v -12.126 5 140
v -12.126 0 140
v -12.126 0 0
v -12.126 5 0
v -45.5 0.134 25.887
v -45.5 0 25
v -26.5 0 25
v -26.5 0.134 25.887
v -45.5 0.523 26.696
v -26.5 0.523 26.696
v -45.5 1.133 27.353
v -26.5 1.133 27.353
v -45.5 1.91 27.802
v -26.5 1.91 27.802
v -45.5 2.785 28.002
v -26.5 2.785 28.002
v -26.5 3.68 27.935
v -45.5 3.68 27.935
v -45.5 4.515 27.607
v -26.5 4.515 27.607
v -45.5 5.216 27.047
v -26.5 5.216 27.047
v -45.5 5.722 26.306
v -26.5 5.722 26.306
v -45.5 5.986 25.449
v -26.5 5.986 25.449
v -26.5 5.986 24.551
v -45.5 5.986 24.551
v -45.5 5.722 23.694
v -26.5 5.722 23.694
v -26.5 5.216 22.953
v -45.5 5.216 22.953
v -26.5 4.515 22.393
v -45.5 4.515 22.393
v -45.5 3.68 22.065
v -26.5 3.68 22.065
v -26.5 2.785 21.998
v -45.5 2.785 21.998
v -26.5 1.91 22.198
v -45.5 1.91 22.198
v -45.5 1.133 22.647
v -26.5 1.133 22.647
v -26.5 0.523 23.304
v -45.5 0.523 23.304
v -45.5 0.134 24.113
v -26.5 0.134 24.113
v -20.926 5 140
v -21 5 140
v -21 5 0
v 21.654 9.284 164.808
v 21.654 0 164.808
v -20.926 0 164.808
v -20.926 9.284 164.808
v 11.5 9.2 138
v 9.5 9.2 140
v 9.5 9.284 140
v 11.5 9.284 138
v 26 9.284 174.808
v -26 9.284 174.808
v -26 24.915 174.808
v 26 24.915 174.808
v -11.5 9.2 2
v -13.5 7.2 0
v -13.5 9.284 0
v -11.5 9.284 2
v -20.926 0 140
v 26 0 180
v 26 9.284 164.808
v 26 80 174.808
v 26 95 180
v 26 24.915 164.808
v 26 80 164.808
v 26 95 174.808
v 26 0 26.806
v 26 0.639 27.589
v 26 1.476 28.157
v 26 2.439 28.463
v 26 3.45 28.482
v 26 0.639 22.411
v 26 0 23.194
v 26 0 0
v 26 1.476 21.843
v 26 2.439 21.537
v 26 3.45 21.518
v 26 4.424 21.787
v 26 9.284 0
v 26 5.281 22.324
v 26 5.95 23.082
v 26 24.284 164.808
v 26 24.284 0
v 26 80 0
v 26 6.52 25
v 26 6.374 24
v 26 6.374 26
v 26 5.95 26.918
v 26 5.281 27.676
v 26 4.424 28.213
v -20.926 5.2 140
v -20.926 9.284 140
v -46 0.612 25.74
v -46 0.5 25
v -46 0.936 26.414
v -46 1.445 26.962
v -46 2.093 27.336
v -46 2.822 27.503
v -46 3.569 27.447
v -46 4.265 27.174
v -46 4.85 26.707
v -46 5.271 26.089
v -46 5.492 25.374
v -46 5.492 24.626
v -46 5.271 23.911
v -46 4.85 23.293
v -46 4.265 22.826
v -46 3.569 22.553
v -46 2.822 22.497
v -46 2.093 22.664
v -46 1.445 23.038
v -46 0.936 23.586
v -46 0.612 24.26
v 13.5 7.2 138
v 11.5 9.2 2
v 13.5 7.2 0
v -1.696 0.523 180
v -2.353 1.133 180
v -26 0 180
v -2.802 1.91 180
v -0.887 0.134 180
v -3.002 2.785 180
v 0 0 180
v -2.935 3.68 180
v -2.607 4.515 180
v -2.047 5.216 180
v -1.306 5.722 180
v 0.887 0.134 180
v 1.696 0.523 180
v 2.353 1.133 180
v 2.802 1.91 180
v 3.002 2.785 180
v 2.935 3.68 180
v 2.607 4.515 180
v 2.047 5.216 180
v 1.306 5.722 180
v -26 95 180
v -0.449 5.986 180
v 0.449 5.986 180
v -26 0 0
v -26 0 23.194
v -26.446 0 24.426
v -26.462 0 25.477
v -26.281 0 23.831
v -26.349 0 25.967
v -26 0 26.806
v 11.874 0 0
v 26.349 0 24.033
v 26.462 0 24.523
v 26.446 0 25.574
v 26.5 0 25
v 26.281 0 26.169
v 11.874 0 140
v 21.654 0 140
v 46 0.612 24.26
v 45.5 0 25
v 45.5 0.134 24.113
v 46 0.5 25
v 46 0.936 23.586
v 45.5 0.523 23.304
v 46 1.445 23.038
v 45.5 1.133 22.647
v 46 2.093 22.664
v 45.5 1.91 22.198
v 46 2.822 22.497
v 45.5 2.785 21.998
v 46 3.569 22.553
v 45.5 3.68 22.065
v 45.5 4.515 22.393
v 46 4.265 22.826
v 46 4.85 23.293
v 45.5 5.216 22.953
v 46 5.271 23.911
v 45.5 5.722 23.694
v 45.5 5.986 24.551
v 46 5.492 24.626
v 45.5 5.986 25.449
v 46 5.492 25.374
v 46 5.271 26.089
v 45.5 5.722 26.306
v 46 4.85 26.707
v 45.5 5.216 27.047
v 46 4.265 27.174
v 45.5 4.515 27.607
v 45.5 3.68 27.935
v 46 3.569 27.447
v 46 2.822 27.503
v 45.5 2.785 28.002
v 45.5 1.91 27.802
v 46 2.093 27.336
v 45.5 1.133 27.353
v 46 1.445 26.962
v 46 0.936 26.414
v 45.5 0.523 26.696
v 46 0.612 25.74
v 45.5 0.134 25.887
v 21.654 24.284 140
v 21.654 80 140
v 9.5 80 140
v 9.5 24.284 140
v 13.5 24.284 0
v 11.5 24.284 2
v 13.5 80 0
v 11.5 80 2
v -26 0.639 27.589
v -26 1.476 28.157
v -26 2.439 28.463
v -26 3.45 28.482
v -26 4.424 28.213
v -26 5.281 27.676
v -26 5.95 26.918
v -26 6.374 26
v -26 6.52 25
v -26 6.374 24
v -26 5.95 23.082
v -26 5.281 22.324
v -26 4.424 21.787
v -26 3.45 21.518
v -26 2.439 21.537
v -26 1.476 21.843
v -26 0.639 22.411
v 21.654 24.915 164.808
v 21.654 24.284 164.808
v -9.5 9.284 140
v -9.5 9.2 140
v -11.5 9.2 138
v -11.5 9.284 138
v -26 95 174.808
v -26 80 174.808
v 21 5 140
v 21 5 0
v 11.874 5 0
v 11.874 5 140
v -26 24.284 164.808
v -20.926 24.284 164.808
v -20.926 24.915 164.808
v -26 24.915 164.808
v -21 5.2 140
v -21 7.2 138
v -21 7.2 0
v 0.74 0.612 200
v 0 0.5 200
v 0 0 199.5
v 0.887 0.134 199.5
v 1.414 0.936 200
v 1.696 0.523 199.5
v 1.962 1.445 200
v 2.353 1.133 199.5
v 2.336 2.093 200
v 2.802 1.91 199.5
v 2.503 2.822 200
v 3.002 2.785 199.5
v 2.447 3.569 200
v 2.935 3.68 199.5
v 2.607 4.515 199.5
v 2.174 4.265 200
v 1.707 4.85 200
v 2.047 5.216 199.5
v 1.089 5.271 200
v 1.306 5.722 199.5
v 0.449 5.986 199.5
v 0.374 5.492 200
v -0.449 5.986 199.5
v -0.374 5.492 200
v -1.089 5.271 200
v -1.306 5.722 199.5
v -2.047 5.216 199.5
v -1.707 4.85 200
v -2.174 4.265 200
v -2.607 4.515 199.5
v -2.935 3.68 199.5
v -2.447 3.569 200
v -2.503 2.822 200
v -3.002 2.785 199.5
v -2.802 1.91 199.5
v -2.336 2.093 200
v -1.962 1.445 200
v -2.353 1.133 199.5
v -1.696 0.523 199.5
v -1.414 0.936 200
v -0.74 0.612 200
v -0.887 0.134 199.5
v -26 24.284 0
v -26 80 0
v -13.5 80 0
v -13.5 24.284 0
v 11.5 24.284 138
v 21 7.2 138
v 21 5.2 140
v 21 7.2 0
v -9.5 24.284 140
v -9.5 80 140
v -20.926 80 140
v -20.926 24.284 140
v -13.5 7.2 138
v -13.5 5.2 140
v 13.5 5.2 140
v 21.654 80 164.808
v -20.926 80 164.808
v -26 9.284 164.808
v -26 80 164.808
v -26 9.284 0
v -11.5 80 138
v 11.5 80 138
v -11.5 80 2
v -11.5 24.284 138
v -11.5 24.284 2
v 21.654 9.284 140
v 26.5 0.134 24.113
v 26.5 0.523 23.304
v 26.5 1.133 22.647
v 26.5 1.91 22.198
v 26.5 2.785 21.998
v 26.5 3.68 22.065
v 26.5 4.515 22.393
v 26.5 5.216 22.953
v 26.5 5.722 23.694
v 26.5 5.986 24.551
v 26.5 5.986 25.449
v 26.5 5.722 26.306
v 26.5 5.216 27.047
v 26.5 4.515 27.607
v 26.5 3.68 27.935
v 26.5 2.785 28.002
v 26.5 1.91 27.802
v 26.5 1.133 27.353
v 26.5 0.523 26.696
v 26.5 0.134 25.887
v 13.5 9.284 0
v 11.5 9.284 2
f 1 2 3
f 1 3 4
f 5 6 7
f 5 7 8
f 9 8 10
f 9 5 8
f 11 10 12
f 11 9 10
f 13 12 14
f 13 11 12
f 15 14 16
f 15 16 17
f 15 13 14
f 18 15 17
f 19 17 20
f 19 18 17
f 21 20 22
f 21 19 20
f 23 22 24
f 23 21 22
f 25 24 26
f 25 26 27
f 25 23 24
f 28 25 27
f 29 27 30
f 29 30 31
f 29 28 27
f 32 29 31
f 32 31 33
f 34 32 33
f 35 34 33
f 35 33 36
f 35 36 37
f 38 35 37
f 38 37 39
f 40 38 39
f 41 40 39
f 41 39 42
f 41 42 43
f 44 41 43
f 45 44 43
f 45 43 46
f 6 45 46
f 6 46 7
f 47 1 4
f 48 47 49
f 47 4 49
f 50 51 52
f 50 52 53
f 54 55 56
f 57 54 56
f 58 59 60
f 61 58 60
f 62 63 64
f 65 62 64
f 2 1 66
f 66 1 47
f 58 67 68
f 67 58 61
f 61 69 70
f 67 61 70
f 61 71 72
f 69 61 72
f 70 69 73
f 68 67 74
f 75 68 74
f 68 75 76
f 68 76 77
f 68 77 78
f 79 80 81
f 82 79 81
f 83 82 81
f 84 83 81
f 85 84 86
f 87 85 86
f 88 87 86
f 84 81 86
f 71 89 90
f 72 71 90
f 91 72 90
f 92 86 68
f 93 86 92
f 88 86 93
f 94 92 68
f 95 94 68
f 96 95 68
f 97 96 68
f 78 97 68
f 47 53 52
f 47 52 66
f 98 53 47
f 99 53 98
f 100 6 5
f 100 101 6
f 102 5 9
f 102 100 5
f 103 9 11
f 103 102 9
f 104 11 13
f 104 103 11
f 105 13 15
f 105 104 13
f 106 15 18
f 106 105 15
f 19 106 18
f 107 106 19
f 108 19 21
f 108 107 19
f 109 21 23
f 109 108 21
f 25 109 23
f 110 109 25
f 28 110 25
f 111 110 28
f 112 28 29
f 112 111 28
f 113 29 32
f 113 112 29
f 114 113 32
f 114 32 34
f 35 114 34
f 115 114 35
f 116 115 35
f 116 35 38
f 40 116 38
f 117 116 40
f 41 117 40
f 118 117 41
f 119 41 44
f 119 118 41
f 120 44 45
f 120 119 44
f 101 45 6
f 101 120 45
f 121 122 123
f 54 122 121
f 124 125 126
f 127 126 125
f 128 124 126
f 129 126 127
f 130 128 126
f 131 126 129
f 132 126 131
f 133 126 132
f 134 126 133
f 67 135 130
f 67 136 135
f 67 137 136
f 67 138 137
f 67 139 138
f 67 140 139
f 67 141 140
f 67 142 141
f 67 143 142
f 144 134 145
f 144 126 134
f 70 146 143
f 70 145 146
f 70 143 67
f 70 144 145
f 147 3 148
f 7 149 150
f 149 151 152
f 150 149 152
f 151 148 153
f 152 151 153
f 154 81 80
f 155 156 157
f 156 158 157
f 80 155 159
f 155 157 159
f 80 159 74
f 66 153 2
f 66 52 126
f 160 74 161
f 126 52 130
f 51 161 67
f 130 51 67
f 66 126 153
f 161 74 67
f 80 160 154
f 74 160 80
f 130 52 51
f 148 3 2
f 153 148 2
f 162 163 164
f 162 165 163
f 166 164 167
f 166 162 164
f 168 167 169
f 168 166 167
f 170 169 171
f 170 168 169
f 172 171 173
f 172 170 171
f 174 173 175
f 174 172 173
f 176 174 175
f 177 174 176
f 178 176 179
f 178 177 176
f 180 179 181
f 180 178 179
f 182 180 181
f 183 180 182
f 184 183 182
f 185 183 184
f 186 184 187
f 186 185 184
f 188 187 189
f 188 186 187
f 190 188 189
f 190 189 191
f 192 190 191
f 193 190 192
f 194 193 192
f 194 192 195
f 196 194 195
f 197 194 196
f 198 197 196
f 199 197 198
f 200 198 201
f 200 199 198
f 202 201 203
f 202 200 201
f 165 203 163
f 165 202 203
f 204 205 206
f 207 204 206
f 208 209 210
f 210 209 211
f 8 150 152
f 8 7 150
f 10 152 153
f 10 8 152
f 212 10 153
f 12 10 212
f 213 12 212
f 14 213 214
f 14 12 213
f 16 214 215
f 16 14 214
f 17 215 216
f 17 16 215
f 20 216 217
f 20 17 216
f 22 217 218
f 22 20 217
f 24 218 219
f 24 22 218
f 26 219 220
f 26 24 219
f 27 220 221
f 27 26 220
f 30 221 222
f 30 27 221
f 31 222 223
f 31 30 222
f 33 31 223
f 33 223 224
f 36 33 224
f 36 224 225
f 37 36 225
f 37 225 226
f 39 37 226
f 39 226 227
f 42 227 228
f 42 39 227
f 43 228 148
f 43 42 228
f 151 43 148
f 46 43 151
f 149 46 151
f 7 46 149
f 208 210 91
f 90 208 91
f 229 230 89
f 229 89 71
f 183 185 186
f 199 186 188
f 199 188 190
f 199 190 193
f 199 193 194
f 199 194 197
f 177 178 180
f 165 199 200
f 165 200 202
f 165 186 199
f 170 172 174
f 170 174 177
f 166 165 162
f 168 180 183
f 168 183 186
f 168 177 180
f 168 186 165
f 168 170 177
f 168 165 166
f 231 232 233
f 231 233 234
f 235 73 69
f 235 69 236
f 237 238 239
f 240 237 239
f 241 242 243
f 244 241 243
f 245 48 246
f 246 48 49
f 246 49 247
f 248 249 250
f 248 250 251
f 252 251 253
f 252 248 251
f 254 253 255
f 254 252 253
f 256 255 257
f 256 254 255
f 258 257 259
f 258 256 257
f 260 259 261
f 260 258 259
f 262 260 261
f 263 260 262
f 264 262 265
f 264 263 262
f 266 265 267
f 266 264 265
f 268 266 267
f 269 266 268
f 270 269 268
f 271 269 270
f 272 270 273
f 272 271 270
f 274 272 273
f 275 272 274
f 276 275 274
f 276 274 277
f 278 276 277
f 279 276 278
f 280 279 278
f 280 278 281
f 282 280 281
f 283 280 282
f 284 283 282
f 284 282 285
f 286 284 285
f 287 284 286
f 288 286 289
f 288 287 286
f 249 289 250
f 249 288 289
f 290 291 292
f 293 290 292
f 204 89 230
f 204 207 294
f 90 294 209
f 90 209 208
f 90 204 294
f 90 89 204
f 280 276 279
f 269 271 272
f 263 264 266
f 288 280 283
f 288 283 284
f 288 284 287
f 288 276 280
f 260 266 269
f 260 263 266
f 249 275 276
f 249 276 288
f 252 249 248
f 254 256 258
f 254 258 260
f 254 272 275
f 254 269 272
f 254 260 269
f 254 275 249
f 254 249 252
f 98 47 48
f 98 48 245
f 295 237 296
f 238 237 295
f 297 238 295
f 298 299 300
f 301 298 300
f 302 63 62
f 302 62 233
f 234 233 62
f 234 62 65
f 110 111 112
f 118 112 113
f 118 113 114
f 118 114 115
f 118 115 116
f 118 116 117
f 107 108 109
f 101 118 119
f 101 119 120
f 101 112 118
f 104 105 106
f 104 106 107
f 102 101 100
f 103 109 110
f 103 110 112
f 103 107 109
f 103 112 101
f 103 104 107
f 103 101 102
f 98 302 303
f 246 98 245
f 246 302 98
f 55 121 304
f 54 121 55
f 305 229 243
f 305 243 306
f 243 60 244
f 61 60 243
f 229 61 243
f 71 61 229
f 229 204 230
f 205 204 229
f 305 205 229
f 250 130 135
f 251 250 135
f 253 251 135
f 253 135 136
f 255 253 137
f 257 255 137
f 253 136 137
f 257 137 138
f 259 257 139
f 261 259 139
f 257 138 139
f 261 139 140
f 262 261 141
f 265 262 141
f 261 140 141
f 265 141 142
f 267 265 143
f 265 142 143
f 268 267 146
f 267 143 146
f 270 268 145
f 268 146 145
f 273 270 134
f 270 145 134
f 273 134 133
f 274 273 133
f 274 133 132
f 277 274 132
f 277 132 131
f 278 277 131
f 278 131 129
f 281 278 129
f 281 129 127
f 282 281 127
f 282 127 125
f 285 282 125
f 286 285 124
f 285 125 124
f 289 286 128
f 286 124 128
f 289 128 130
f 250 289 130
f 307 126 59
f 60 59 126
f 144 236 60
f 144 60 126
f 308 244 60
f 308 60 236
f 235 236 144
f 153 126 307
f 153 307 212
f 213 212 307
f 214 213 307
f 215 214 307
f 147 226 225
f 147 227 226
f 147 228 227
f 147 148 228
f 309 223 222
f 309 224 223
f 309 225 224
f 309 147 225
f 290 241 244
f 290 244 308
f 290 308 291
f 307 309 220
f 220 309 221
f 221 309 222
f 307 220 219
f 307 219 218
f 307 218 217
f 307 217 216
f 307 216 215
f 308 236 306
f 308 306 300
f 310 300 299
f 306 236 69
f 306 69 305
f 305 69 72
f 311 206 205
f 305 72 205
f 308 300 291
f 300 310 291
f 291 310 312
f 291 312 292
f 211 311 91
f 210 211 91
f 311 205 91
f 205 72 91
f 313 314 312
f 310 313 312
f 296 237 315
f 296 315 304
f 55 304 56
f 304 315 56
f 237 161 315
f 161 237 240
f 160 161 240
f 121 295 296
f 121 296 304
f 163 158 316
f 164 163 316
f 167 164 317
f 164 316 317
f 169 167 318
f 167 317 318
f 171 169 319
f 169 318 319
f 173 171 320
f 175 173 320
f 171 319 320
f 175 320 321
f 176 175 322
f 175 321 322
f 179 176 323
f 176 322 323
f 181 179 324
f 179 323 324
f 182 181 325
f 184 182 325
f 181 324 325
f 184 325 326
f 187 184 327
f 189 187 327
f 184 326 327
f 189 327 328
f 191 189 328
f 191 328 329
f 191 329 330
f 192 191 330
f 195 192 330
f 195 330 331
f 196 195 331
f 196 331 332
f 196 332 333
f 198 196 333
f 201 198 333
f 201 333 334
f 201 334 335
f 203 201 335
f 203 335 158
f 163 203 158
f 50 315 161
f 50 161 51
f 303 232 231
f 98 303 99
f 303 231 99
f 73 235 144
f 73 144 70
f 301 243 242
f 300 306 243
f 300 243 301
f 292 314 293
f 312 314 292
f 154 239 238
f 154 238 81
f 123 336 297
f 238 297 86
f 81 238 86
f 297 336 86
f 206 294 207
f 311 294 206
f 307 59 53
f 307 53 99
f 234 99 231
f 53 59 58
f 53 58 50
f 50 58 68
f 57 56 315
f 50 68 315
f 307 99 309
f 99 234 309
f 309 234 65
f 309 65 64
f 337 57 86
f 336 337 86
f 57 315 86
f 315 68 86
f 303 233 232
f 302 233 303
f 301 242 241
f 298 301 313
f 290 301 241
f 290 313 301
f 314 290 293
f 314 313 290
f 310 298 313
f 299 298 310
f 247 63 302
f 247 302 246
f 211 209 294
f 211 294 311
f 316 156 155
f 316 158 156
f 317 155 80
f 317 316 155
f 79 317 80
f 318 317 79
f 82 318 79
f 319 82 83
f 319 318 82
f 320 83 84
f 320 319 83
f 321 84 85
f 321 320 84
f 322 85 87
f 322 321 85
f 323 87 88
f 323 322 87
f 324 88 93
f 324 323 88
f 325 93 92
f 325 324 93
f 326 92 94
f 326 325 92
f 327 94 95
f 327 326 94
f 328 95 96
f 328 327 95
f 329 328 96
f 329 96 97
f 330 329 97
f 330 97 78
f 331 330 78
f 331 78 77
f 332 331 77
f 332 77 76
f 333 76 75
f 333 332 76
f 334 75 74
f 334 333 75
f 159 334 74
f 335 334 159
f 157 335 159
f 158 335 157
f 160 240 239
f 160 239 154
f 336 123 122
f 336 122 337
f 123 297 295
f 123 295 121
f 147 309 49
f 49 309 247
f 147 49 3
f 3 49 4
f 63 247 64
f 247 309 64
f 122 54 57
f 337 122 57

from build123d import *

# Parameters (mm, degrees)
SKETCH_1_W           = 52
SKETCH_1_H           = 95
EXTRUDE_1_DEPTH      = 180
SKETCH_2_W           = 23
SKETCH_2_H           = 90
CUT_EXTRUDE_1_DEPTH  = 140
SKETCH_3_W           = 9.5
SKETCH_3_H           = 2.2
CUT_EXTRUDE_2_DEPTH  = 140
CHAMFER_1_SIZE       = 2
CUT_EXTRUDE_3_DEPTH  = 140
SKETCH_5_W           = 140
SKETCH_5_H           = 15
CUT_EXTRUDE_4_DEPTH  = 140
SKETCH_6_W           = 140
SKETCH_6_H           = 15
CUT_EXTRUDE_7_DEPTH  = 140
CUT_EXTRUDE_8_DEPTH  = 140
SKETCH_8_W           = 24.808453611
SKETCH_8_H           = 15
CUT_EXTRUDE_9_DEPTH  = 140
SKETCH_9_W           = 10
SKETCH_9_H           = 14.176065277
SKETCH_9_H_2         = 15.630765607
CUT_EXTRUDE_10_DEPTH = 140
SKETCH_10_W          = 52
SKETCH_10_H          = 0.823934723
CUT_EXTRUDE_11_DEPTH = 10
SKETCH_12_R          = 3.01
EXTRUDE_2_DEPTH      = 20
CHAMFER_3_SIZE       = 0.5
SKETCH_13_R          = 3.01
EXTRUDE_4_DEPTH      = 20
CHAMFER_4_SIZE       = 0.5
EXTRUDE_START        = 20
SKETCH_15_R          = 3.01
EXTRUDE_5_DEPTH      = 20
CHAMFER_5_SIZE       = 0.5


with BuildPart() as part:
    # 草图1 → 凸台-拉伸1 (new body)
    with BuildSketch(Plane.XY):
        with Locations((0, 47.5)):
            Rectangle(SKETCH_1_W, SKETCH_1_H)
    extrude(amount=EXTRUDE_1_DEPTH)

    # 草图2 → 切除-拉伸1 (cut)
    with BuildSketch(Plane(origin=(0, 0, 0), x_dir=(-1, 0, 0), z_dir=(0, 0, -1))):
        with Locations((0, 50)):
            Rectangle(SKETCH_2_W, SKETCH_2_H)
    extrude(amount=-CUT_EXTRUDE_1_DEPTH, mode=Mode.SUBTRACT)

    # 草图3 → 切除-拉伸2 (cut)
    with BuildSketch(Plane(origin=(0, 0, 0), x_dir=(-1, 0, 0), z_dir=(0, 0, -1))):
        with Locations((-16.25, 6.1)):
            Rectangle(SKETCH_3_W, SKETCH_3_H)
        with Locations((16.25, 6.1)):
            Rectangle(SKETCH_3_W, SKETCH_3_H)
    extrude(amount=-CUT_EXTRUDE_2_DEPTH, mode=Mode.SUBTRACT)

    # 倒角1
    chamfer_1_edges = [part.edges().sort_by_distance(p)[0] for p in [
        (11.5, 51.1, 140),
        (0, 95, 140),
        (11.5, 95, 70),
        (-11.5, 95, 70),
        (11.5, 51.1, 0),
        (-11.5, 51.1, 140),
        (-11.5, 51.1, 0),
        (11.5, 7.2, 70),
        (16.25, 7.2, 140),
        (-16.25, 7.2, 140),
        (-11.5, 7.2, 70),
    ]]
    chamfer(chamfer_1_edges, length=CHAMFER_1_SIZE)

    # 草图4 → 切除-拉伸3 (cut)
    with BuildSketch(Plane(origin=(0, 0, 0), x_dir=(-1, 0, 0), z_dir=(0, 0, -1))):
        Polygon((-0.565514489, 0), (0, 0), (12.126296858, 0), (12.126296858, 5), (-11.873703142, 5), (-11.873703142, 0), align=None)
    extrude(amount=-CUT_EXTRUDE_3_DEPTH, mode=Mode.SUBTRACT)

    # 草图5 → 切除-拉伸4 (cut)
    with BuildSketch(Plane(origin=(26, 0, 0), x_dir=(0, 0, -1), z_dir=(1, 0, 0))):
        with Locations((-70, 87.5)):
            Rectangle(SKETCH_5_W, SKETCH_5_H)
    extrude(amount=-CUT_EXTRUDE_4_DEPTH, mode=Mode.SUBTRACT)

    # 草图6 → 切除-拉伸7 (cut)
    with BuildSketch(Plane(origin=(26, 0, 0), x_dir=(0, 0, -1), z_dir=(1, 0, 0))):
        with Locations((-70, 16.784197303)):
            Rectangle(SKETCH_6_W, SKETCH_6_H)
    extrude(amount=-CUT_EXTRUDE_7_DEPTH, mode=Mode.SUBTRACT)

    # 草图7 → 切除-拉伸8 (cut)
    with BuildSketch(Plane(origin=(0, 95, 0), x_dir=(1, 0, 0), z_dir=(0, 1, 0))):
        Polygon((0, -140), (21.6540992, -140), (21.6540992, -164.808453611), (-20.3459008, -164.808453611), (-20.926391083, -164.808453611), (-20.926391083, -140), align=None)
    extrude(amount=-CUT_EXTRUDE_8_DEPTH, mode=Mode.SUBTRACT)

    # 草图8 → 切除-拉伸9 (cut)
    with BuildSketch(Plane(origin=(26, 0, 0), x_dir=(0, 0, -1), z_dir=(1, 0, 0))):
        with Locations((-152.404226806, 87.5)):
            Rectangle(SKETCH_8_W, SKETCH_8_H)
        with Locations((-152.404226806, 16.784197303)):
            Rectangle(SKETCH_8_W, SKETCH_8_H)
    extrude(amount=-CUT_EXTRUDE_9_DEPTH, mode=Mode.SUBTRACT)

    # 草图9 → 切除-拉伸10 (cut)
    with BuildSketch(Plane(origin=(26, 0, 0), x_dir=(0, 0, -1), z_dir=(1, 0, 0))):
        with Locations((-169.808453611, 87.911967362)):
            Rectangle(SKETCH_9_W, SKETCH_9_H)
        with Locations((-169.808453611, 17.099580106)):
            Rectangle(SKETCH_9_W, SKETCH_9_H_2)
    extrude(amount=-CUT_EXTRUDE_10_DEPTH, mode=Mode.SUBTRACT)

    # 草图10 → 切除-拉伸11 (cut)
    with BuildSketch(Plane(origin=(0, 0, 164.808453611), x_dir=(-1, 0, 0), z_dir=(0, 0, -1))):
        with Locations((0, 80.411967362)):
            Rectangle(SKETCH_10_W, SKETCH_10_H)
    extrude(amount=-CUT_EXTRUDE_11_DEPTH, mode=Mode.SUBTRACT)

    # 草图12 → 凸台-拉伸2 (add)
    with BuildSketch(Plane.XY.offset(180)):
        with Locations(Location((0, 3.01, 0), (0, 0, 270))):
            Circle(SKETCH_12_R)
    extrude(amount=EXTRUDE_2_DEPTH)

    # 倒角3
    chamfer_3_edges = [part.edges().sort_by_distance(p)[0] for p in [
        (0, 6.02, 200),
    ]]
    chamfer(chamfer_3_edges, length=CHAMFER_3_SIZE)

    # 草图13 → 凸台-拉伸4 (add)
    with BuildSketch(Plane(origin=(26, 0, 0), x_dir=(0, 0, -1), z_dir=(1, 0, 0))):
        with Locations(Location((-25, 3.01, 0), (0, 0, 270))):
            Circle(SKETCH_13_R)
    extrude(amount=EXTRUDE_4_DEPTH)

    # 倒角4
    # the kernel refuses this chamfer: 0.5 mm, written as the material it adds along each edge
    with BuildSketch(Plane(origin=(26, 3.01, 25), x_dir=(0, -1, 0), z_dir=(0, 0, 1))) as chamfer_4_piece_1_section:
        Polygon((3.01 + CHAMFER_4_SIZE, 0), (3.01, CHAMFER_4_SIZE), (3.01, 0), align=None)
    chamfer_4_piece_1 = revolve(axis=Axis((26, 3.01, 25), (1, 0, 0)), mode=Mode.PRIVATE)
    chamfer_4_piece_1 = split(chamfer_4_piece_1, bisect_by=Plane(origin=(26.240420809, 0, 25), z_dir=(0, 1, 0)), keep=Keep.TOP, mode=Mode.PRIVATE)
    add(chamfer_4_piece_1)
    # the kernel refuses this chamfer: 0.5 mm, written as the material it takes off along each edge
    with BuildSketch(Plane(origin=(46, 3.01, 25), x_dir=(0, -1, 0), z_dir=(0, 0, 1))) as chamfer_4_2_piece_1:
        Polygon((3.01, -CHAMFER_4_SIZE), (3.01 - CHAMFER_4_SIZE, 0), (3.01, 0), align=None)
    revolve(axis=Axis((46, 3.01, 25), (1, 0, 0)), mode=Mode.SUBTRACT)

    # 草图15 → 凸台-拉伸5 (add)
    with BuildSketch(Plane.ZY.offset(26).offset(EXTRUDE_START)):
        with Locations(Location((25, 3.01, 0), (0, 0, 270))):
            Circle(SKETCH_15_R)
    extrude(amount=-EXTRUDE_5_DEPTH)

    # 倒角5
    # the kernel refuses this chamfer: 0.5 mm, written as the material it adds along each edge
    with BuildSketch(Plane(origin=(-26, 3.01, 25), x_dir=(0, -1, 0), z_dir=(0, 0, -1))) as chamfer_5_piece_1_section:
        Polygon((3.01 + CHAMFER_5_SIZE, 0), (3.01, CHAMFER_5_SIZE), (3.01, 0), align=None)
    chamfer_5_piece_1 = revolve(axis=Axis((-26, 3.01, 25), (-1, 0, 0)), mode=Mode.PRIVATE)
    chamfer_5_piece_1 = split(chamfer_5_piece_1, bisect_by=Plane(origin=(-26.240420809, 0, 25), z_dir=(0, 1, 0)), keep=Keep.TOP, mode=Mode.PRIVATE)
    add(chamfer_5_piece_1)
    # the kernel refuses this chamfer: 0.5 mm, written as the material it takes off along each edge
    with BuildSketch(Plane(origin=(-46, 3.01, 25), x_dir=(0, -1, 0), z_dir=(0, 0, -1))) as chamfer_5_2_piece_1:
        Polygon((3.01, -CHAMFER_5_SIZE), (3.01 - CHAMFER_5_SIZE, 0), (3.01, 0), align=None)
    revolve(axis=Axis((-46, 3.01, 25), (-1, 0, 0)), mode=Mode.SUBTRACT)


solid = part.part
